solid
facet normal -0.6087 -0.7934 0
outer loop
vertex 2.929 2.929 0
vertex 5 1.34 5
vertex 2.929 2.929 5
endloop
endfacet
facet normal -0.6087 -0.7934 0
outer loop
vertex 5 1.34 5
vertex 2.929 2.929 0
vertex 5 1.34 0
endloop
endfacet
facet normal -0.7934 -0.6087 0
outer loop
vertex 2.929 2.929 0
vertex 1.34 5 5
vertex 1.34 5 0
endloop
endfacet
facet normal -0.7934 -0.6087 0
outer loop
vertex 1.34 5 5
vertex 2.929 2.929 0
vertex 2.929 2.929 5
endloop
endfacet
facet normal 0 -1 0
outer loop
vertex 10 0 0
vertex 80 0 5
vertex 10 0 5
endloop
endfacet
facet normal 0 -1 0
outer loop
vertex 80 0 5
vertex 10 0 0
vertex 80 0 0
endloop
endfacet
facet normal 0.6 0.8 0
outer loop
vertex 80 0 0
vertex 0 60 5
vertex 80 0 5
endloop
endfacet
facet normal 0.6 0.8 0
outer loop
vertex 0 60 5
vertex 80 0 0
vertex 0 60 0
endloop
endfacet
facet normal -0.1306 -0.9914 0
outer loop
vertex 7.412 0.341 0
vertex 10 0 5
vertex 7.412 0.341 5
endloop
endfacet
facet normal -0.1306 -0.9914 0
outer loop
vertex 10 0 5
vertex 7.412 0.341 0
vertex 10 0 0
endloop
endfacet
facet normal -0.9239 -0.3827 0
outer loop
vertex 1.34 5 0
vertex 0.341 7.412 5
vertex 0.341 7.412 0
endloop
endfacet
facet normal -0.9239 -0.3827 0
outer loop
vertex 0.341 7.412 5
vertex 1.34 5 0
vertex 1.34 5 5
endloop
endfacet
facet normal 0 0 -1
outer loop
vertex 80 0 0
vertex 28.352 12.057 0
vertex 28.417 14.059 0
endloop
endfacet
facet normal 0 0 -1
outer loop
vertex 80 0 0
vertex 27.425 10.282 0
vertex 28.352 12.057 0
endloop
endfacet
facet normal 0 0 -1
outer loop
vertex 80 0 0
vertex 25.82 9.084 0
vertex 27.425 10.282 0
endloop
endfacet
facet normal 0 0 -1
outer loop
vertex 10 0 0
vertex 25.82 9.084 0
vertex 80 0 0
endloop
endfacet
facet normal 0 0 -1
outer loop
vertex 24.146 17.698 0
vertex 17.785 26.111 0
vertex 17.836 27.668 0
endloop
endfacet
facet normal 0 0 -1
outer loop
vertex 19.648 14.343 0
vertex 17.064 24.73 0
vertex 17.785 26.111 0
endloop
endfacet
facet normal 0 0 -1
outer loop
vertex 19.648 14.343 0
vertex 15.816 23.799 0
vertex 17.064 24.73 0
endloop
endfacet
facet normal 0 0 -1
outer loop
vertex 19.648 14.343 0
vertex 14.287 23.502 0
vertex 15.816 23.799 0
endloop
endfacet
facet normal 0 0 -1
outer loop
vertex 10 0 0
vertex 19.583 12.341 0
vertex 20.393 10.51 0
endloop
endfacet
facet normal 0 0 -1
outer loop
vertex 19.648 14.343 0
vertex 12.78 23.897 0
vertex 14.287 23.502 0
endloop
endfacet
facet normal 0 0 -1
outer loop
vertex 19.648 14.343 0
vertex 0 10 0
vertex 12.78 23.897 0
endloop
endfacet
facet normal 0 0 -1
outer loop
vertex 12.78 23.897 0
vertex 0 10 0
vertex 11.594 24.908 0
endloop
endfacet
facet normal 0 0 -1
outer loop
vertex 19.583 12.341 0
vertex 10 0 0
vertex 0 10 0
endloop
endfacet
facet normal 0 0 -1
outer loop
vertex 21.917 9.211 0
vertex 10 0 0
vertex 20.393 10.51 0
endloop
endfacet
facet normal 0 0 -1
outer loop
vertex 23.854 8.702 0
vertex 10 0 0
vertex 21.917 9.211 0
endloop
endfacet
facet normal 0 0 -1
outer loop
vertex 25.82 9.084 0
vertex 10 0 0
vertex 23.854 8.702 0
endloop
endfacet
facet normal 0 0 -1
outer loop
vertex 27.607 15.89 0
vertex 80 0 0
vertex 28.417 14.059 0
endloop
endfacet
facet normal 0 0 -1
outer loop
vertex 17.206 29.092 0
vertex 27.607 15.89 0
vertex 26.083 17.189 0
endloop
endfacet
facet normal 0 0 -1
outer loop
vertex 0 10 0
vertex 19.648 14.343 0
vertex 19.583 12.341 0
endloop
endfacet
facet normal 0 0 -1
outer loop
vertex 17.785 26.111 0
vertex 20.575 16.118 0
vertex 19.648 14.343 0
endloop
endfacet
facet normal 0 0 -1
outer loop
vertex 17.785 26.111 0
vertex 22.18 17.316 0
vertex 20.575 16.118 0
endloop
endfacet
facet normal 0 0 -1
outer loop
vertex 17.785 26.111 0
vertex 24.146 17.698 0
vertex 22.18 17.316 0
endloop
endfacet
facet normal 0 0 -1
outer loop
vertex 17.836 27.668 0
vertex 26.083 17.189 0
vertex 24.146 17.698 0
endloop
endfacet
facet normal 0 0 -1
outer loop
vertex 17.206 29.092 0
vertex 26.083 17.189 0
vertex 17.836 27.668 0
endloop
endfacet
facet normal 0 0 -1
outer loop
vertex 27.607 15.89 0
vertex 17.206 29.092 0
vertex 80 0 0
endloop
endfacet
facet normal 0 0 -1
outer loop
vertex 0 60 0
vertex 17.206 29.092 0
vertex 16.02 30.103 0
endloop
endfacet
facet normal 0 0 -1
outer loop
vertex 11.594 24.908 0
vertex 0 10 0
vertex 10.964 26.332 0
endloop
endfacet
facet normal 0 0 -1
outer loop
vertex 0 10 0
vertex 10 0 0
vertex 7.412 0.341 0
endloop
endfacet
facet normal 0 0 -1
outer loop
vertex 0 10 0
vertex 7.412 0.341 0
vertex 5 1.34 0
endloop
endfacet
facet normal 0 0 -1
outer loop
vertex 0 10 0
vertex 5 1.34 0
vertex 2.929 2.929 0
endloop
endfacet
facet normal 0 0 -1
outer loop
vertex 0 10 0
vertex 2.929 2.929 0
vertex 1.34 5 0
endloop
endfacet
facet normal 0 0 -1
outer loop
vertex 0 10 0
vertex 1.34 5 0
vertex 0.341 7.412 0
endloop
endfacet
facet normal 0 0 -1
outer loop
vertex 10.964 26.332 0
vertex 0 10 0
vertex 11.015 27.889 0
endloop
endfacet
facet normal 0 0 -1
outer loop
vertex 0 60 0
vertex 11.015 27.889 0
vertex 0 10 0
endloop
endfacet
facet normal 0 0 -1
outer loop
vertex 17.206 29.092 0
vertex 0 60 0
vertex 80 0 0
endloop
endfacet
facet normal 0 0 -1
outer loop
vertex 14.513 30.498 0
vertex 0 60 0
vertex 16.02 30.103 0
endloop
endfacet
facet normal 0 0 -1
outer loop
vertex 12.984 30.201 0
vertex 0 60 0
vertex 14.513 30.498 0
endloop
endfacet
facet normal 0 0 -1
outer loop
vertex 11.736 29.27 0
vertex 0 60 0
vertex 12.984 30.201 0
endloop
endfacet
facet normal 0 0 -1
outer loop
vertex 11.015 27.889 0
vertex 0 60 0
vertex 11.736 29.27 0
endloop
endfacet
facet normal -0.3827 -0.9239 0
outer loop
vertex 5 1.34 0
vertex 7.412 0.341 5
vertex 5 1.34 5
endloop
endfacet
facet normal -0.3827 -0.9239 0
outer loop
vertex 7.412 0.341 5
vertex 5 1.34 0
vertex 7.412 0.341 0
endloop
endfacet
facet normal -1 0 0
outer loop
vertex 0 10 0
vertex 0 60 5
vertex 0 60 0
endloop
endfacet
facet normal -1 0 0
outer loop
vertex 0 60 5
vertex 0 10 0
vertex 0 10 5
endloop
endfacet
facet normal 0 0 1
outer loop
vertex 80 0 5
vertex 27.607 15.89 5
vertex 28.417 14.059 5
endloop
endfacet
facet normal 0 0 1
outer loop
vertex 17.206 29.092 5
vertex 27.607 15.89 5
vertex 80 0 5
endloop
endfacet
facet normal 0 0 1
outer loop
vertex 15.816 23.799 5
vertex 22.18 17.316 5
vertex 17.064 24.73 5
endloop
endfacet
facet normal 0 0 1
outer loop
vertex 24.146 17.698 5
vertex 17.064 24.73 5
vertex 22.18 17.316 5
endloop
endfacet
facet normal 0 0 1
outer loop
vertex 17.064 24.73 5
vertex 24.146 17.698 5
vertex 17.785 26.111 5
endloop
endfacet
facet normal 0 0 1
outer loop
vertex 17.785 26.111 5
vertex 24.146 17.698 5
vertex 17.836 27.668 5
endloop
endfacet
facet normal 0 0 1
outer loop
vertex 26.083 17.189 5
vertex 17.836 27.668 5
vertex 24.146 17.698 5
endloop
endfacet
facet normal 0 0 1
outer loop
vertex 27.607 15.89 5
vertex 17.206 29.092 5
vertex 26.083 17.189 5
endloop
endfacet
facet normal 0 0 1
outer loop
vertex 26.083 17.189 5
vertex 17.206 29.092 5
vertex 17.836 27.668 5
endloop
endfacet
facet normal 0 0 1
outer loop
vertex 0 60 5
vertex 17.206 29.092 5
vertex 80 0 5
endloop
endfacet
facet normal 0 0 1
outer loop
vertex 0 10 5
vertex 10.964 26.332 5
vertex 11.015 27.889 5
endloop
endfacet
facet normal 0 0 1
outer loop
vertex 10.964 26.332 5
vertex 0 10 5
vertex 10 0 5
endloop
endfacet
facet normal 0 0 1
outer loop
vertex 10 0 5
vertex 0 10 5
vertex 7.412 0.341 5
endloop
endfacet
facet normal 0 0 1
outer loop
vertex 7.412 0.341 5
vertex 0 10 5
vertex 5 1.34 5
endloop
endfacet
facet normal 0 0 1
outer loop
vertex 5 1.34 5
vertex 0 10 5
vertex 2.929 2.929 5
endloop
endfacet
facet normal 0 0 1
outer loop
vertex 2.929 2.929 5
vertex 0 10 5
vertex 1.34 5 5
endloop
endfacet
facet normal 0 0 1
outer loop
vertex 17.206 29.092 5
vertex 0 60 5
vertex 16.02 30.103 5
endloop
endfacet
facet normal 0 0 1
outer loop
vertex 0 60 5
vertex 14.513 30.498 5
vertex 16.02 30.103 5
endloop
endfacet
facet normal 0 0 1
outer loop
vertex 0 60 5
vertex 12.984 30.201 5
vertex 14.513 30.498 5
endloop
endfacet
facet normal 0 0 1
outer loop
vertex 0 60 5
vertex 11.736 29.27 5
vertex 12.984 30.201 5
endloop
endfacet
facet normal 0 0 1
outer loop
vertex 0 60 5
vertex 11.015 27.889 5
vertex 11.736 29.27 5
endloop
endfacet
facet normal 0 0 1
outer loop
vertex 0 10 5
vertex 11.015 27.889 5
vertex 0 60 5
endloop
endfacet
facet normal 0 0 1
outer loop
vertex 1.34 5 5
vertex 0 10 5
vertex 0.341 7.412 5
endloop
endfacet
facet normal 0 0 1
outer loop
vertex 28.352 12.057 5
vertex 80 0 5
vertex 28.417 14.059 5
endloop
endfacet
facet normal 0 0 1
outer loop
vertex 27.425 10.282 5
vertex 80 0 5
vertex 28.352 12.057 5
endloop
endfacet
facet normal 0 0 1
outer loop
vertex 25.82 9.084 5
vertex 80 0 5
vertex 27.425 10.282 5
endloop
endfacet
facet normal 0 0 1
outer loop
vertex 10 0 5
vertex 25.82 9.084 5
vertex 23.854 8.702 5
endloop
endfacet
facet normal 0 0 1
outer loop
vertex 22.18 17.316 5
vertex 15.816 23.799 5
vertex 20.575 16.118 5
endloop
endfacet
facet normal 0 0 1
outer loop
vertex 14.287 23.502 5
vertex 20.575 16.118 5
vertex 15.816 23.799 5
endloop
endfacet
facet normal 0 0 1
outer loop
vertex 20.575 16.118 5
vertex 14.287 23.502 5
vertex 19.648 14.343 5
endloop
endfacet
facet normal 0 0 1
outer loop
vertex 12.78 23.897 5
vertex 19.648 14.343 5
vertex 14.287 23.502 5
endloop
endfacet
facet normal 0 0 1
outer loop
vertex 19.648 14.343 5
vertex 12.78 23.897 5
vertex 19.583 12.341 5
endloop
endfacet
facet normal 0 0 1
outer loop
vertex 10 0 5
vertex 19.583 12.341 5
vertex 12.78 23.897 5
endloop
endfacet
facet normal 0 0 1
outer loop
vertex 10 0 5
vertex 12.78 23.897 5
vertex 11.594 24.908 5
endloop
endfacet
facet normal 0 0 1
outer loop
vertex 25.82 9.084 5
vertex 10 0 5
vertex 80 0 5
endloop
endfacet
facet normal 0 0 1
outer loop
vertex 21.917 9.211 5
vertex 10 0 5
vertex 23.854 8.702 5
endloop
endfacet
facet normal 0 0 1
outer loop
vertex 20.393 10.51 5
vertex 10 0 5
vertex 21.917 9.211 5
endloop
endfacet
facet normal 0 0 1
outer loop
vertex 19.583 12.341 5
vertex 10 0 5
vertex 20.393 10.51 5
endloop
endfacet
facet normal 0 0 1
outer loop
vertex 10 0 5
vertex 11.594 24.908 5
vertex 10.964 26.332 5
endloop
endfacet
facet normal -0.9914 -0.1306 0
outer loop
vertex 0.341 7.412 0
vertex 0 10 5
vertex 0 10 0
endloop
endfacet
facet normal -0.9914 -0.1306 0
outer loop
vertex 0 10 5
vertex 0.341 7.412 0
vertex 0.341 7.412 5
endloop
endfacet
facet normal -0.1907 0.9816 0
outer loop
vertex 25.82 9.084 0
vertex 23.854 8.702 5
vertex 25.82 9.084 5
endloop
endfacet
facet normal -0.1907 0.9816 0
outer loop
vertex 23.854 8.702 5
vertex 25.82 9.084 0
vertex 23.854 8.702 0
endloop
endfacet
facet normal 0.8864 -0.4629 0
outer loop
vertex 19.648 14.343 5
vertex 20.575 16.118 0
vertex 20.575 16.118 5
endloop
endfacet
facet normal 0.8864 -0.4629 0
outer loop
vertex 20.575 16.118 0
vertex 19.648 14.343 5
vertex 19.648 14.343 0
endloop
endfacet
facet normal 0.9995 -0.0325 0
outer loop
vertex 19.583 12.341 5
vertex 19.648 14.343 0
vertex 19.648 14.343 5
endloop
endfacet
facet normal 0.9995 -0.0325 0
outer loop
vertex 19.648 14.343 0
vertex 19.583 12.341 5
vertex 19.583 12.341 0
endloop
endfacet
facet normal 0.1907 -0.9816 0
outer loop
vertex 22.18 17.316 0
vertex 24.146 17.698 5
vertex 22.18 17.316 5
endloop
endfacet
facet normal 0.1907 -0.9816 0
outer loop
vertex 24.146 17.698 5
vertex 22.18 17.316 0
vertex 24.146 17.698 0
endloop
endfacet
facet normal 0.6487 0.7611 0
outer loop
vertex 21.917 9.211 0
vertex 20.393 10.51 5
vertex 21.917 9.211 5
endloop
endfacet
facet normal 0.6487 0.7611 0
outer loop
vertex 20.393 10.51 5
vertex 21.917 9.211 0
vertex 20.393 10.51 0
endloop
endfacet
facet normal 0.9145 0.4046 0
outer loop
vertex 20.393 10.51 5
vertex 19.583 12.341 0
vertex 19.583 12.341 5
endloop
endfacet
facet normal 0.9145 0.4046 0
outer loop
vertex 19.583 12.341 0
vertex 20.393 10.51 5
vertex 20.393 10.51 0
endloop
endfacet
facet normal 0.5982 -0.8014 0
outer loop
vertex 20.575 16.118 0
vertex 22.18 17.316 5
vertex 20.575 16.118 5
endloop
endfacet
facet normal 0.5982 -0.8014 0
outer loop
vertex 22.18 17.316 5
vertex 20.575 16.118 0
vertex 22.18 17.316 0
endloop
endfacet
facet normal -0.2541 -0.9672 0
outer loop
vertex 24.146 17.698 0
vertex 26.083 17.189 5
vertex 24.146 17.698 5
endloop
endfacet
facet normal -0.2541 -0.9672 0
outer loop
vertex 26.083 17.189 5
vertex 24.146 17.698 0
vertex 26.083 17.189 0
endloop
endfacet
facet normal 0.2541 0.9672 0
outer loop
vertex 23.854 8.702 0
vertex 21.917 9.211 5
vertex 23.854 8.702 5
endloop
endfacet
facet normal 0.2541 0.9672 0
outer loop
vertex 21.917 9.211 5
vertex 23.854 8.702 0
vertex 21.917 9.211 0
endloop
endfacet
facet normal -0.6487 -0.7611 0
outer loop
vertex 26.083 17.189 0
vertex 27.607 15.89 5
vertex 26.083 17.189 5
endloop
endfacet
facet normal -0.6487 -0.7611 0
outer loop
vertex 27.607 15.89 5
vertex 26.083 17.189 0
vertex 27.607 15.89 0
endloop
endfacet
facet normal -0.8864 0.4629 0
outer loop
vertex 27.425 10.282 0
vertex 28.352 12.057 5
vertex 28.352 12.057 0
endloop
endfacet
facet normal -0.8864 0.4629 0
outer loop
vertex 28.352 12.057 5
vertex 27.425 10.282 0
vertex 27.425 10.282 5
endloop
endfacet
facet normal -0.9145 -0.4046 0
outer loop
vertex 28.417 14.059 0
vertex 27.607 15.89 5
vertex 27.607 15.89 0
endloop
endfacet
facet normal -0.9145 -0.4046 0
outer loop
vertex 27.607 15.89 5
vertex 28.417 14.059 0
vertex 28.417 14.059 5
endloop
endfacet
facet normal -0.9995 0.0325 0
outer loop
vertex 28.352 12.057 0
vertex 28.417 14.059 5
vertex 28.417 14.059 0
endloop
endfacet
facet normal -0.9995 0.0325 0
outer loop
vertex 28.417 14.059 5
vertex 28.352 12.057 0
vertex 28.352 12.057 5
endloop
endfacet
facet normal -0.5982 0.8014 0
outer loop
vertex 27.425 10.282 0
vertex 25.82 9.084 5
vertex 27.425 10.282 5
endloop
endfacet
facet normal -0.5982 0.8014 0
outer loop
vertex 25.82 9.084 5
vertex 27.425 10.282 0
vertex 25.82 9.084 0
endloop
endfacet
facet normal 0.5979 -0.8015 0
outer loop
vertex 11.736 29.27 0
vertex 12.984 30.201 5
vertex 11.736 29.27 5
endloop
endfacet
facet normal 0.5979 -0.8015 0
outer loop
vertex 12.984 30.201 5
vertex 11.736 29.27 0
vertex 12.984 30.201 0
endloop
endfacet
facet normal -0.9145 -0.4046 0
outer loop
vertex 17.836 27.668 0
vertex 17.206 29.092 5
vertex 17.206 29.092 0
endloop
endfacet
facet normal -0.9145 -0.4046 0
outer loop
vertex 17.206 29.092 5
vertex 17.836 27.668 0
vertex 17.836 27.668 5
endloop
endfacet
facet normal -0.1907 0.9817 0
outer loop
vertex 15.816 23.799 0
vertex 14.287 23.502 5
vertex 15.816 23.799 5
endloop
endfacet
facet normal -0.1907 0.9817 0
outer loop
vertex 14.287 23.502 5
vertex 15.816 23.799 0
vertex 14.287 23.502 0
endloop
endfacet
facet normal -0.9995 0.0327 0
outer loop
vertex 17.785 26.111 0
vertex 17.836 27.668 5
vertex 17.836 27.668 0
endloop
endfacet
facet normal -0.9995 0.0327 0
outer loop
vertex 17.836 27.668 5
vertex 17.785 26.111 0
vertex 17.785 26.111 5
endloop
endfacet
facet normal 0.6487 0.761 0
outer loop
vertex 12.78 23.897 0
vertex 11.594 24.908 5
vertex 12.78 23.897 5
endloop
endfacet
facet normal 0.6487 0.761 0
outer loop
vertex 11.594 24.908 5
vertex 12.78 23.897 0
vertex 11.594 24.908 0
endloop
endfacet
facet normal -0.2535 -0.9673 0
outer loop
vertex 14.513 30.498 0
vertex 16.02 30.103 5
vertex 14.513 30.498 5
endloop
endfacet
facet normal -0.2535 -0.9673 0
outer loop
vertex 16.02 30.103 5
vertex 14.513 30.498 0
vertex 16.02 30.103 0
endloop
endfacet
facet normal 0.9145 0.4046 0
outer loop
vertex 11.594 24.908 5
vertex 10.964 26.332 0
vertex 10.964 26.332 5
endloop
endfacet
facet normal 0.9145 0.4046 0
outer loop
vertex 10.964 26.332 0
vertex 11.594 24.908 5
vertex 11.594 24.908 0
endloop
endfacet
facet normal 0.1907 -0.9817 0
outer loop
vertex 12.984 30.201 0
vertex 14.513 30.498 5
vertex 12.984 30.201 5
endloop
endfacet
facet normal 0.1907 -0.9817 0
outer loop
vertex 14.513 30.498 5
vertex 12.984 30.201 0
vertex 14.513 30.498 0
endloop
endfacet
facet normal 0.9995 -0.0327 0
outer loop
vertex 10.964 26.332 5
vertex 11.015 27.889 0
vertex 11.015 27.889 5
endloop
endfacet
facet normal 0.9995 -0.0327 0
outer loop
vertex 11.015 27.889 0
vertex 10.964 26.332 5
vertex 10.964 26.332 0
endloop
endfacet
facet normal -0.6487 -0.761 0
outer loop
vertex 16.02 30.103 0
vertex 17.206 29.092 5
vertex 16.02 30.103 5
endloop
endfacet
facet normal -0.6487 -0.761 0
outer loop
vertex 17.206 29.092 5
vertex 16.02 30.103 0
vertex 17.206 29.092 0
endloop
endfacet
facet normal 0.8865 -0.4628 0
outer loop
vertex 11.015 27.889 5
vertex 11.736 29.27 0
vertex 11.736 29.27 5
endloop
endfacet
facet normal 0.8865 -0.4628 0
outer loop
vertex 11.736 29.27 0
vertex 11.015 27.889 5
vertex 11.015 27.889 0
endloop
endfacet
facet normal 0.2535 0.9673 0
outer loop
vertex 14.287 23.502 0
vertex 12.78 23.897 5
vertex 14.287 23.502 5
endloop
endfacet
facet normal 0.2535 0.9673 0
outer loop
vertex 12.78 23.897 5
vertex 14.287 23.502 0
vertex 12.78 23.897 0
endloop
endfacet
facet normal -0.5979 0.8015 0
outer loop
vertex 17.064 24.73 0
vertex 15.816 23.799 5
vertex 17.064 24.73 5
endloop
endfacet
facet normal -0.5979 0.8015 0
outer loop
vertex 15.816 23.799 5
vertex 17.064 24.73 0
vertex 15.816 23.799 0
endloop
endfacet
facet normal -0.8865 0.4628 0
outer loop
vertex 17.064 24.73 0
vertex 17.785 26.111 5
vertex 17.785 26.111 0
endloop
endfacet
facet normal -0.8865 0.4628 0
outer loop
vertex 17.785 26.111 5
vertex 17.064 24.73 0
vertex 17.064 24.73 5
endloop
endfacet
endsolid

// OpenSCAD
$fn = 32;

// ----------------------------------------------------------------------
// Bracket plate: corner pad 80 x 60, fillet R10
// ----------------------------------------------------------------------

// --- parameters (mm) ---
hole_r = 3.5;             // bolt hole radius
plate_t = 5;              // plate thickness, Z (extrusion height)
leg_a = 80;               // base leg
leg_b = 60;               // height leg
fillet_r = 10;            // right-angle fillet radius

hole_d1 = 2 * hole_r + 2;
hole_d2 = 2 * hole_r;

profile = [[10, 0], [80, 0], [0, 60], [0, 10], [0.341, 7.412], [1.34, 5], [2.929, 2.929], [5, 1.34], [7.412, 0.341]];  // primary outline, 9 points, counter clockwise
void_1 = [[28.417, 14.059], [27.607, 15.89], [26.083, 17.189], [24.146, 17.698], [22.18, 17.316], [20.575, 16.118], [19.648, 14.343], [19.583, 12.341], [20.393, 10.51], [21.917, 9.211], [23.854, 8.702], [25.82, 9.084], [27.425, 10.282], [28.352, 12.057]];  // mount hole 1, 14 points
void_2 = [[17.836, 27.668], [17.206, 29.092], [16.02, 30.103], [14.513, 30.498], [12.984, 30.201], [11.736, 29.27], [11.015, 27.889], [10.964, 26.332], [11.594, 24.908], [12.78, 23.897], [14.287, 23.502], [15.816, 23.799], [17.064, 24.73], [17.785, 26.111]];  // mount hole 2, 14 points

// --- the one profile operation ---
difference() {
  linear_extrude(height = plate_t) polygon(points = profile);
  translate([0, 0, -1])
    linear_extrude(height = plate_t + 2) polygon(points = void_1);
  translate([0, 0, -1])
    linear_extrude(height = plate_t + 2) polygon(points = void_2);
}
